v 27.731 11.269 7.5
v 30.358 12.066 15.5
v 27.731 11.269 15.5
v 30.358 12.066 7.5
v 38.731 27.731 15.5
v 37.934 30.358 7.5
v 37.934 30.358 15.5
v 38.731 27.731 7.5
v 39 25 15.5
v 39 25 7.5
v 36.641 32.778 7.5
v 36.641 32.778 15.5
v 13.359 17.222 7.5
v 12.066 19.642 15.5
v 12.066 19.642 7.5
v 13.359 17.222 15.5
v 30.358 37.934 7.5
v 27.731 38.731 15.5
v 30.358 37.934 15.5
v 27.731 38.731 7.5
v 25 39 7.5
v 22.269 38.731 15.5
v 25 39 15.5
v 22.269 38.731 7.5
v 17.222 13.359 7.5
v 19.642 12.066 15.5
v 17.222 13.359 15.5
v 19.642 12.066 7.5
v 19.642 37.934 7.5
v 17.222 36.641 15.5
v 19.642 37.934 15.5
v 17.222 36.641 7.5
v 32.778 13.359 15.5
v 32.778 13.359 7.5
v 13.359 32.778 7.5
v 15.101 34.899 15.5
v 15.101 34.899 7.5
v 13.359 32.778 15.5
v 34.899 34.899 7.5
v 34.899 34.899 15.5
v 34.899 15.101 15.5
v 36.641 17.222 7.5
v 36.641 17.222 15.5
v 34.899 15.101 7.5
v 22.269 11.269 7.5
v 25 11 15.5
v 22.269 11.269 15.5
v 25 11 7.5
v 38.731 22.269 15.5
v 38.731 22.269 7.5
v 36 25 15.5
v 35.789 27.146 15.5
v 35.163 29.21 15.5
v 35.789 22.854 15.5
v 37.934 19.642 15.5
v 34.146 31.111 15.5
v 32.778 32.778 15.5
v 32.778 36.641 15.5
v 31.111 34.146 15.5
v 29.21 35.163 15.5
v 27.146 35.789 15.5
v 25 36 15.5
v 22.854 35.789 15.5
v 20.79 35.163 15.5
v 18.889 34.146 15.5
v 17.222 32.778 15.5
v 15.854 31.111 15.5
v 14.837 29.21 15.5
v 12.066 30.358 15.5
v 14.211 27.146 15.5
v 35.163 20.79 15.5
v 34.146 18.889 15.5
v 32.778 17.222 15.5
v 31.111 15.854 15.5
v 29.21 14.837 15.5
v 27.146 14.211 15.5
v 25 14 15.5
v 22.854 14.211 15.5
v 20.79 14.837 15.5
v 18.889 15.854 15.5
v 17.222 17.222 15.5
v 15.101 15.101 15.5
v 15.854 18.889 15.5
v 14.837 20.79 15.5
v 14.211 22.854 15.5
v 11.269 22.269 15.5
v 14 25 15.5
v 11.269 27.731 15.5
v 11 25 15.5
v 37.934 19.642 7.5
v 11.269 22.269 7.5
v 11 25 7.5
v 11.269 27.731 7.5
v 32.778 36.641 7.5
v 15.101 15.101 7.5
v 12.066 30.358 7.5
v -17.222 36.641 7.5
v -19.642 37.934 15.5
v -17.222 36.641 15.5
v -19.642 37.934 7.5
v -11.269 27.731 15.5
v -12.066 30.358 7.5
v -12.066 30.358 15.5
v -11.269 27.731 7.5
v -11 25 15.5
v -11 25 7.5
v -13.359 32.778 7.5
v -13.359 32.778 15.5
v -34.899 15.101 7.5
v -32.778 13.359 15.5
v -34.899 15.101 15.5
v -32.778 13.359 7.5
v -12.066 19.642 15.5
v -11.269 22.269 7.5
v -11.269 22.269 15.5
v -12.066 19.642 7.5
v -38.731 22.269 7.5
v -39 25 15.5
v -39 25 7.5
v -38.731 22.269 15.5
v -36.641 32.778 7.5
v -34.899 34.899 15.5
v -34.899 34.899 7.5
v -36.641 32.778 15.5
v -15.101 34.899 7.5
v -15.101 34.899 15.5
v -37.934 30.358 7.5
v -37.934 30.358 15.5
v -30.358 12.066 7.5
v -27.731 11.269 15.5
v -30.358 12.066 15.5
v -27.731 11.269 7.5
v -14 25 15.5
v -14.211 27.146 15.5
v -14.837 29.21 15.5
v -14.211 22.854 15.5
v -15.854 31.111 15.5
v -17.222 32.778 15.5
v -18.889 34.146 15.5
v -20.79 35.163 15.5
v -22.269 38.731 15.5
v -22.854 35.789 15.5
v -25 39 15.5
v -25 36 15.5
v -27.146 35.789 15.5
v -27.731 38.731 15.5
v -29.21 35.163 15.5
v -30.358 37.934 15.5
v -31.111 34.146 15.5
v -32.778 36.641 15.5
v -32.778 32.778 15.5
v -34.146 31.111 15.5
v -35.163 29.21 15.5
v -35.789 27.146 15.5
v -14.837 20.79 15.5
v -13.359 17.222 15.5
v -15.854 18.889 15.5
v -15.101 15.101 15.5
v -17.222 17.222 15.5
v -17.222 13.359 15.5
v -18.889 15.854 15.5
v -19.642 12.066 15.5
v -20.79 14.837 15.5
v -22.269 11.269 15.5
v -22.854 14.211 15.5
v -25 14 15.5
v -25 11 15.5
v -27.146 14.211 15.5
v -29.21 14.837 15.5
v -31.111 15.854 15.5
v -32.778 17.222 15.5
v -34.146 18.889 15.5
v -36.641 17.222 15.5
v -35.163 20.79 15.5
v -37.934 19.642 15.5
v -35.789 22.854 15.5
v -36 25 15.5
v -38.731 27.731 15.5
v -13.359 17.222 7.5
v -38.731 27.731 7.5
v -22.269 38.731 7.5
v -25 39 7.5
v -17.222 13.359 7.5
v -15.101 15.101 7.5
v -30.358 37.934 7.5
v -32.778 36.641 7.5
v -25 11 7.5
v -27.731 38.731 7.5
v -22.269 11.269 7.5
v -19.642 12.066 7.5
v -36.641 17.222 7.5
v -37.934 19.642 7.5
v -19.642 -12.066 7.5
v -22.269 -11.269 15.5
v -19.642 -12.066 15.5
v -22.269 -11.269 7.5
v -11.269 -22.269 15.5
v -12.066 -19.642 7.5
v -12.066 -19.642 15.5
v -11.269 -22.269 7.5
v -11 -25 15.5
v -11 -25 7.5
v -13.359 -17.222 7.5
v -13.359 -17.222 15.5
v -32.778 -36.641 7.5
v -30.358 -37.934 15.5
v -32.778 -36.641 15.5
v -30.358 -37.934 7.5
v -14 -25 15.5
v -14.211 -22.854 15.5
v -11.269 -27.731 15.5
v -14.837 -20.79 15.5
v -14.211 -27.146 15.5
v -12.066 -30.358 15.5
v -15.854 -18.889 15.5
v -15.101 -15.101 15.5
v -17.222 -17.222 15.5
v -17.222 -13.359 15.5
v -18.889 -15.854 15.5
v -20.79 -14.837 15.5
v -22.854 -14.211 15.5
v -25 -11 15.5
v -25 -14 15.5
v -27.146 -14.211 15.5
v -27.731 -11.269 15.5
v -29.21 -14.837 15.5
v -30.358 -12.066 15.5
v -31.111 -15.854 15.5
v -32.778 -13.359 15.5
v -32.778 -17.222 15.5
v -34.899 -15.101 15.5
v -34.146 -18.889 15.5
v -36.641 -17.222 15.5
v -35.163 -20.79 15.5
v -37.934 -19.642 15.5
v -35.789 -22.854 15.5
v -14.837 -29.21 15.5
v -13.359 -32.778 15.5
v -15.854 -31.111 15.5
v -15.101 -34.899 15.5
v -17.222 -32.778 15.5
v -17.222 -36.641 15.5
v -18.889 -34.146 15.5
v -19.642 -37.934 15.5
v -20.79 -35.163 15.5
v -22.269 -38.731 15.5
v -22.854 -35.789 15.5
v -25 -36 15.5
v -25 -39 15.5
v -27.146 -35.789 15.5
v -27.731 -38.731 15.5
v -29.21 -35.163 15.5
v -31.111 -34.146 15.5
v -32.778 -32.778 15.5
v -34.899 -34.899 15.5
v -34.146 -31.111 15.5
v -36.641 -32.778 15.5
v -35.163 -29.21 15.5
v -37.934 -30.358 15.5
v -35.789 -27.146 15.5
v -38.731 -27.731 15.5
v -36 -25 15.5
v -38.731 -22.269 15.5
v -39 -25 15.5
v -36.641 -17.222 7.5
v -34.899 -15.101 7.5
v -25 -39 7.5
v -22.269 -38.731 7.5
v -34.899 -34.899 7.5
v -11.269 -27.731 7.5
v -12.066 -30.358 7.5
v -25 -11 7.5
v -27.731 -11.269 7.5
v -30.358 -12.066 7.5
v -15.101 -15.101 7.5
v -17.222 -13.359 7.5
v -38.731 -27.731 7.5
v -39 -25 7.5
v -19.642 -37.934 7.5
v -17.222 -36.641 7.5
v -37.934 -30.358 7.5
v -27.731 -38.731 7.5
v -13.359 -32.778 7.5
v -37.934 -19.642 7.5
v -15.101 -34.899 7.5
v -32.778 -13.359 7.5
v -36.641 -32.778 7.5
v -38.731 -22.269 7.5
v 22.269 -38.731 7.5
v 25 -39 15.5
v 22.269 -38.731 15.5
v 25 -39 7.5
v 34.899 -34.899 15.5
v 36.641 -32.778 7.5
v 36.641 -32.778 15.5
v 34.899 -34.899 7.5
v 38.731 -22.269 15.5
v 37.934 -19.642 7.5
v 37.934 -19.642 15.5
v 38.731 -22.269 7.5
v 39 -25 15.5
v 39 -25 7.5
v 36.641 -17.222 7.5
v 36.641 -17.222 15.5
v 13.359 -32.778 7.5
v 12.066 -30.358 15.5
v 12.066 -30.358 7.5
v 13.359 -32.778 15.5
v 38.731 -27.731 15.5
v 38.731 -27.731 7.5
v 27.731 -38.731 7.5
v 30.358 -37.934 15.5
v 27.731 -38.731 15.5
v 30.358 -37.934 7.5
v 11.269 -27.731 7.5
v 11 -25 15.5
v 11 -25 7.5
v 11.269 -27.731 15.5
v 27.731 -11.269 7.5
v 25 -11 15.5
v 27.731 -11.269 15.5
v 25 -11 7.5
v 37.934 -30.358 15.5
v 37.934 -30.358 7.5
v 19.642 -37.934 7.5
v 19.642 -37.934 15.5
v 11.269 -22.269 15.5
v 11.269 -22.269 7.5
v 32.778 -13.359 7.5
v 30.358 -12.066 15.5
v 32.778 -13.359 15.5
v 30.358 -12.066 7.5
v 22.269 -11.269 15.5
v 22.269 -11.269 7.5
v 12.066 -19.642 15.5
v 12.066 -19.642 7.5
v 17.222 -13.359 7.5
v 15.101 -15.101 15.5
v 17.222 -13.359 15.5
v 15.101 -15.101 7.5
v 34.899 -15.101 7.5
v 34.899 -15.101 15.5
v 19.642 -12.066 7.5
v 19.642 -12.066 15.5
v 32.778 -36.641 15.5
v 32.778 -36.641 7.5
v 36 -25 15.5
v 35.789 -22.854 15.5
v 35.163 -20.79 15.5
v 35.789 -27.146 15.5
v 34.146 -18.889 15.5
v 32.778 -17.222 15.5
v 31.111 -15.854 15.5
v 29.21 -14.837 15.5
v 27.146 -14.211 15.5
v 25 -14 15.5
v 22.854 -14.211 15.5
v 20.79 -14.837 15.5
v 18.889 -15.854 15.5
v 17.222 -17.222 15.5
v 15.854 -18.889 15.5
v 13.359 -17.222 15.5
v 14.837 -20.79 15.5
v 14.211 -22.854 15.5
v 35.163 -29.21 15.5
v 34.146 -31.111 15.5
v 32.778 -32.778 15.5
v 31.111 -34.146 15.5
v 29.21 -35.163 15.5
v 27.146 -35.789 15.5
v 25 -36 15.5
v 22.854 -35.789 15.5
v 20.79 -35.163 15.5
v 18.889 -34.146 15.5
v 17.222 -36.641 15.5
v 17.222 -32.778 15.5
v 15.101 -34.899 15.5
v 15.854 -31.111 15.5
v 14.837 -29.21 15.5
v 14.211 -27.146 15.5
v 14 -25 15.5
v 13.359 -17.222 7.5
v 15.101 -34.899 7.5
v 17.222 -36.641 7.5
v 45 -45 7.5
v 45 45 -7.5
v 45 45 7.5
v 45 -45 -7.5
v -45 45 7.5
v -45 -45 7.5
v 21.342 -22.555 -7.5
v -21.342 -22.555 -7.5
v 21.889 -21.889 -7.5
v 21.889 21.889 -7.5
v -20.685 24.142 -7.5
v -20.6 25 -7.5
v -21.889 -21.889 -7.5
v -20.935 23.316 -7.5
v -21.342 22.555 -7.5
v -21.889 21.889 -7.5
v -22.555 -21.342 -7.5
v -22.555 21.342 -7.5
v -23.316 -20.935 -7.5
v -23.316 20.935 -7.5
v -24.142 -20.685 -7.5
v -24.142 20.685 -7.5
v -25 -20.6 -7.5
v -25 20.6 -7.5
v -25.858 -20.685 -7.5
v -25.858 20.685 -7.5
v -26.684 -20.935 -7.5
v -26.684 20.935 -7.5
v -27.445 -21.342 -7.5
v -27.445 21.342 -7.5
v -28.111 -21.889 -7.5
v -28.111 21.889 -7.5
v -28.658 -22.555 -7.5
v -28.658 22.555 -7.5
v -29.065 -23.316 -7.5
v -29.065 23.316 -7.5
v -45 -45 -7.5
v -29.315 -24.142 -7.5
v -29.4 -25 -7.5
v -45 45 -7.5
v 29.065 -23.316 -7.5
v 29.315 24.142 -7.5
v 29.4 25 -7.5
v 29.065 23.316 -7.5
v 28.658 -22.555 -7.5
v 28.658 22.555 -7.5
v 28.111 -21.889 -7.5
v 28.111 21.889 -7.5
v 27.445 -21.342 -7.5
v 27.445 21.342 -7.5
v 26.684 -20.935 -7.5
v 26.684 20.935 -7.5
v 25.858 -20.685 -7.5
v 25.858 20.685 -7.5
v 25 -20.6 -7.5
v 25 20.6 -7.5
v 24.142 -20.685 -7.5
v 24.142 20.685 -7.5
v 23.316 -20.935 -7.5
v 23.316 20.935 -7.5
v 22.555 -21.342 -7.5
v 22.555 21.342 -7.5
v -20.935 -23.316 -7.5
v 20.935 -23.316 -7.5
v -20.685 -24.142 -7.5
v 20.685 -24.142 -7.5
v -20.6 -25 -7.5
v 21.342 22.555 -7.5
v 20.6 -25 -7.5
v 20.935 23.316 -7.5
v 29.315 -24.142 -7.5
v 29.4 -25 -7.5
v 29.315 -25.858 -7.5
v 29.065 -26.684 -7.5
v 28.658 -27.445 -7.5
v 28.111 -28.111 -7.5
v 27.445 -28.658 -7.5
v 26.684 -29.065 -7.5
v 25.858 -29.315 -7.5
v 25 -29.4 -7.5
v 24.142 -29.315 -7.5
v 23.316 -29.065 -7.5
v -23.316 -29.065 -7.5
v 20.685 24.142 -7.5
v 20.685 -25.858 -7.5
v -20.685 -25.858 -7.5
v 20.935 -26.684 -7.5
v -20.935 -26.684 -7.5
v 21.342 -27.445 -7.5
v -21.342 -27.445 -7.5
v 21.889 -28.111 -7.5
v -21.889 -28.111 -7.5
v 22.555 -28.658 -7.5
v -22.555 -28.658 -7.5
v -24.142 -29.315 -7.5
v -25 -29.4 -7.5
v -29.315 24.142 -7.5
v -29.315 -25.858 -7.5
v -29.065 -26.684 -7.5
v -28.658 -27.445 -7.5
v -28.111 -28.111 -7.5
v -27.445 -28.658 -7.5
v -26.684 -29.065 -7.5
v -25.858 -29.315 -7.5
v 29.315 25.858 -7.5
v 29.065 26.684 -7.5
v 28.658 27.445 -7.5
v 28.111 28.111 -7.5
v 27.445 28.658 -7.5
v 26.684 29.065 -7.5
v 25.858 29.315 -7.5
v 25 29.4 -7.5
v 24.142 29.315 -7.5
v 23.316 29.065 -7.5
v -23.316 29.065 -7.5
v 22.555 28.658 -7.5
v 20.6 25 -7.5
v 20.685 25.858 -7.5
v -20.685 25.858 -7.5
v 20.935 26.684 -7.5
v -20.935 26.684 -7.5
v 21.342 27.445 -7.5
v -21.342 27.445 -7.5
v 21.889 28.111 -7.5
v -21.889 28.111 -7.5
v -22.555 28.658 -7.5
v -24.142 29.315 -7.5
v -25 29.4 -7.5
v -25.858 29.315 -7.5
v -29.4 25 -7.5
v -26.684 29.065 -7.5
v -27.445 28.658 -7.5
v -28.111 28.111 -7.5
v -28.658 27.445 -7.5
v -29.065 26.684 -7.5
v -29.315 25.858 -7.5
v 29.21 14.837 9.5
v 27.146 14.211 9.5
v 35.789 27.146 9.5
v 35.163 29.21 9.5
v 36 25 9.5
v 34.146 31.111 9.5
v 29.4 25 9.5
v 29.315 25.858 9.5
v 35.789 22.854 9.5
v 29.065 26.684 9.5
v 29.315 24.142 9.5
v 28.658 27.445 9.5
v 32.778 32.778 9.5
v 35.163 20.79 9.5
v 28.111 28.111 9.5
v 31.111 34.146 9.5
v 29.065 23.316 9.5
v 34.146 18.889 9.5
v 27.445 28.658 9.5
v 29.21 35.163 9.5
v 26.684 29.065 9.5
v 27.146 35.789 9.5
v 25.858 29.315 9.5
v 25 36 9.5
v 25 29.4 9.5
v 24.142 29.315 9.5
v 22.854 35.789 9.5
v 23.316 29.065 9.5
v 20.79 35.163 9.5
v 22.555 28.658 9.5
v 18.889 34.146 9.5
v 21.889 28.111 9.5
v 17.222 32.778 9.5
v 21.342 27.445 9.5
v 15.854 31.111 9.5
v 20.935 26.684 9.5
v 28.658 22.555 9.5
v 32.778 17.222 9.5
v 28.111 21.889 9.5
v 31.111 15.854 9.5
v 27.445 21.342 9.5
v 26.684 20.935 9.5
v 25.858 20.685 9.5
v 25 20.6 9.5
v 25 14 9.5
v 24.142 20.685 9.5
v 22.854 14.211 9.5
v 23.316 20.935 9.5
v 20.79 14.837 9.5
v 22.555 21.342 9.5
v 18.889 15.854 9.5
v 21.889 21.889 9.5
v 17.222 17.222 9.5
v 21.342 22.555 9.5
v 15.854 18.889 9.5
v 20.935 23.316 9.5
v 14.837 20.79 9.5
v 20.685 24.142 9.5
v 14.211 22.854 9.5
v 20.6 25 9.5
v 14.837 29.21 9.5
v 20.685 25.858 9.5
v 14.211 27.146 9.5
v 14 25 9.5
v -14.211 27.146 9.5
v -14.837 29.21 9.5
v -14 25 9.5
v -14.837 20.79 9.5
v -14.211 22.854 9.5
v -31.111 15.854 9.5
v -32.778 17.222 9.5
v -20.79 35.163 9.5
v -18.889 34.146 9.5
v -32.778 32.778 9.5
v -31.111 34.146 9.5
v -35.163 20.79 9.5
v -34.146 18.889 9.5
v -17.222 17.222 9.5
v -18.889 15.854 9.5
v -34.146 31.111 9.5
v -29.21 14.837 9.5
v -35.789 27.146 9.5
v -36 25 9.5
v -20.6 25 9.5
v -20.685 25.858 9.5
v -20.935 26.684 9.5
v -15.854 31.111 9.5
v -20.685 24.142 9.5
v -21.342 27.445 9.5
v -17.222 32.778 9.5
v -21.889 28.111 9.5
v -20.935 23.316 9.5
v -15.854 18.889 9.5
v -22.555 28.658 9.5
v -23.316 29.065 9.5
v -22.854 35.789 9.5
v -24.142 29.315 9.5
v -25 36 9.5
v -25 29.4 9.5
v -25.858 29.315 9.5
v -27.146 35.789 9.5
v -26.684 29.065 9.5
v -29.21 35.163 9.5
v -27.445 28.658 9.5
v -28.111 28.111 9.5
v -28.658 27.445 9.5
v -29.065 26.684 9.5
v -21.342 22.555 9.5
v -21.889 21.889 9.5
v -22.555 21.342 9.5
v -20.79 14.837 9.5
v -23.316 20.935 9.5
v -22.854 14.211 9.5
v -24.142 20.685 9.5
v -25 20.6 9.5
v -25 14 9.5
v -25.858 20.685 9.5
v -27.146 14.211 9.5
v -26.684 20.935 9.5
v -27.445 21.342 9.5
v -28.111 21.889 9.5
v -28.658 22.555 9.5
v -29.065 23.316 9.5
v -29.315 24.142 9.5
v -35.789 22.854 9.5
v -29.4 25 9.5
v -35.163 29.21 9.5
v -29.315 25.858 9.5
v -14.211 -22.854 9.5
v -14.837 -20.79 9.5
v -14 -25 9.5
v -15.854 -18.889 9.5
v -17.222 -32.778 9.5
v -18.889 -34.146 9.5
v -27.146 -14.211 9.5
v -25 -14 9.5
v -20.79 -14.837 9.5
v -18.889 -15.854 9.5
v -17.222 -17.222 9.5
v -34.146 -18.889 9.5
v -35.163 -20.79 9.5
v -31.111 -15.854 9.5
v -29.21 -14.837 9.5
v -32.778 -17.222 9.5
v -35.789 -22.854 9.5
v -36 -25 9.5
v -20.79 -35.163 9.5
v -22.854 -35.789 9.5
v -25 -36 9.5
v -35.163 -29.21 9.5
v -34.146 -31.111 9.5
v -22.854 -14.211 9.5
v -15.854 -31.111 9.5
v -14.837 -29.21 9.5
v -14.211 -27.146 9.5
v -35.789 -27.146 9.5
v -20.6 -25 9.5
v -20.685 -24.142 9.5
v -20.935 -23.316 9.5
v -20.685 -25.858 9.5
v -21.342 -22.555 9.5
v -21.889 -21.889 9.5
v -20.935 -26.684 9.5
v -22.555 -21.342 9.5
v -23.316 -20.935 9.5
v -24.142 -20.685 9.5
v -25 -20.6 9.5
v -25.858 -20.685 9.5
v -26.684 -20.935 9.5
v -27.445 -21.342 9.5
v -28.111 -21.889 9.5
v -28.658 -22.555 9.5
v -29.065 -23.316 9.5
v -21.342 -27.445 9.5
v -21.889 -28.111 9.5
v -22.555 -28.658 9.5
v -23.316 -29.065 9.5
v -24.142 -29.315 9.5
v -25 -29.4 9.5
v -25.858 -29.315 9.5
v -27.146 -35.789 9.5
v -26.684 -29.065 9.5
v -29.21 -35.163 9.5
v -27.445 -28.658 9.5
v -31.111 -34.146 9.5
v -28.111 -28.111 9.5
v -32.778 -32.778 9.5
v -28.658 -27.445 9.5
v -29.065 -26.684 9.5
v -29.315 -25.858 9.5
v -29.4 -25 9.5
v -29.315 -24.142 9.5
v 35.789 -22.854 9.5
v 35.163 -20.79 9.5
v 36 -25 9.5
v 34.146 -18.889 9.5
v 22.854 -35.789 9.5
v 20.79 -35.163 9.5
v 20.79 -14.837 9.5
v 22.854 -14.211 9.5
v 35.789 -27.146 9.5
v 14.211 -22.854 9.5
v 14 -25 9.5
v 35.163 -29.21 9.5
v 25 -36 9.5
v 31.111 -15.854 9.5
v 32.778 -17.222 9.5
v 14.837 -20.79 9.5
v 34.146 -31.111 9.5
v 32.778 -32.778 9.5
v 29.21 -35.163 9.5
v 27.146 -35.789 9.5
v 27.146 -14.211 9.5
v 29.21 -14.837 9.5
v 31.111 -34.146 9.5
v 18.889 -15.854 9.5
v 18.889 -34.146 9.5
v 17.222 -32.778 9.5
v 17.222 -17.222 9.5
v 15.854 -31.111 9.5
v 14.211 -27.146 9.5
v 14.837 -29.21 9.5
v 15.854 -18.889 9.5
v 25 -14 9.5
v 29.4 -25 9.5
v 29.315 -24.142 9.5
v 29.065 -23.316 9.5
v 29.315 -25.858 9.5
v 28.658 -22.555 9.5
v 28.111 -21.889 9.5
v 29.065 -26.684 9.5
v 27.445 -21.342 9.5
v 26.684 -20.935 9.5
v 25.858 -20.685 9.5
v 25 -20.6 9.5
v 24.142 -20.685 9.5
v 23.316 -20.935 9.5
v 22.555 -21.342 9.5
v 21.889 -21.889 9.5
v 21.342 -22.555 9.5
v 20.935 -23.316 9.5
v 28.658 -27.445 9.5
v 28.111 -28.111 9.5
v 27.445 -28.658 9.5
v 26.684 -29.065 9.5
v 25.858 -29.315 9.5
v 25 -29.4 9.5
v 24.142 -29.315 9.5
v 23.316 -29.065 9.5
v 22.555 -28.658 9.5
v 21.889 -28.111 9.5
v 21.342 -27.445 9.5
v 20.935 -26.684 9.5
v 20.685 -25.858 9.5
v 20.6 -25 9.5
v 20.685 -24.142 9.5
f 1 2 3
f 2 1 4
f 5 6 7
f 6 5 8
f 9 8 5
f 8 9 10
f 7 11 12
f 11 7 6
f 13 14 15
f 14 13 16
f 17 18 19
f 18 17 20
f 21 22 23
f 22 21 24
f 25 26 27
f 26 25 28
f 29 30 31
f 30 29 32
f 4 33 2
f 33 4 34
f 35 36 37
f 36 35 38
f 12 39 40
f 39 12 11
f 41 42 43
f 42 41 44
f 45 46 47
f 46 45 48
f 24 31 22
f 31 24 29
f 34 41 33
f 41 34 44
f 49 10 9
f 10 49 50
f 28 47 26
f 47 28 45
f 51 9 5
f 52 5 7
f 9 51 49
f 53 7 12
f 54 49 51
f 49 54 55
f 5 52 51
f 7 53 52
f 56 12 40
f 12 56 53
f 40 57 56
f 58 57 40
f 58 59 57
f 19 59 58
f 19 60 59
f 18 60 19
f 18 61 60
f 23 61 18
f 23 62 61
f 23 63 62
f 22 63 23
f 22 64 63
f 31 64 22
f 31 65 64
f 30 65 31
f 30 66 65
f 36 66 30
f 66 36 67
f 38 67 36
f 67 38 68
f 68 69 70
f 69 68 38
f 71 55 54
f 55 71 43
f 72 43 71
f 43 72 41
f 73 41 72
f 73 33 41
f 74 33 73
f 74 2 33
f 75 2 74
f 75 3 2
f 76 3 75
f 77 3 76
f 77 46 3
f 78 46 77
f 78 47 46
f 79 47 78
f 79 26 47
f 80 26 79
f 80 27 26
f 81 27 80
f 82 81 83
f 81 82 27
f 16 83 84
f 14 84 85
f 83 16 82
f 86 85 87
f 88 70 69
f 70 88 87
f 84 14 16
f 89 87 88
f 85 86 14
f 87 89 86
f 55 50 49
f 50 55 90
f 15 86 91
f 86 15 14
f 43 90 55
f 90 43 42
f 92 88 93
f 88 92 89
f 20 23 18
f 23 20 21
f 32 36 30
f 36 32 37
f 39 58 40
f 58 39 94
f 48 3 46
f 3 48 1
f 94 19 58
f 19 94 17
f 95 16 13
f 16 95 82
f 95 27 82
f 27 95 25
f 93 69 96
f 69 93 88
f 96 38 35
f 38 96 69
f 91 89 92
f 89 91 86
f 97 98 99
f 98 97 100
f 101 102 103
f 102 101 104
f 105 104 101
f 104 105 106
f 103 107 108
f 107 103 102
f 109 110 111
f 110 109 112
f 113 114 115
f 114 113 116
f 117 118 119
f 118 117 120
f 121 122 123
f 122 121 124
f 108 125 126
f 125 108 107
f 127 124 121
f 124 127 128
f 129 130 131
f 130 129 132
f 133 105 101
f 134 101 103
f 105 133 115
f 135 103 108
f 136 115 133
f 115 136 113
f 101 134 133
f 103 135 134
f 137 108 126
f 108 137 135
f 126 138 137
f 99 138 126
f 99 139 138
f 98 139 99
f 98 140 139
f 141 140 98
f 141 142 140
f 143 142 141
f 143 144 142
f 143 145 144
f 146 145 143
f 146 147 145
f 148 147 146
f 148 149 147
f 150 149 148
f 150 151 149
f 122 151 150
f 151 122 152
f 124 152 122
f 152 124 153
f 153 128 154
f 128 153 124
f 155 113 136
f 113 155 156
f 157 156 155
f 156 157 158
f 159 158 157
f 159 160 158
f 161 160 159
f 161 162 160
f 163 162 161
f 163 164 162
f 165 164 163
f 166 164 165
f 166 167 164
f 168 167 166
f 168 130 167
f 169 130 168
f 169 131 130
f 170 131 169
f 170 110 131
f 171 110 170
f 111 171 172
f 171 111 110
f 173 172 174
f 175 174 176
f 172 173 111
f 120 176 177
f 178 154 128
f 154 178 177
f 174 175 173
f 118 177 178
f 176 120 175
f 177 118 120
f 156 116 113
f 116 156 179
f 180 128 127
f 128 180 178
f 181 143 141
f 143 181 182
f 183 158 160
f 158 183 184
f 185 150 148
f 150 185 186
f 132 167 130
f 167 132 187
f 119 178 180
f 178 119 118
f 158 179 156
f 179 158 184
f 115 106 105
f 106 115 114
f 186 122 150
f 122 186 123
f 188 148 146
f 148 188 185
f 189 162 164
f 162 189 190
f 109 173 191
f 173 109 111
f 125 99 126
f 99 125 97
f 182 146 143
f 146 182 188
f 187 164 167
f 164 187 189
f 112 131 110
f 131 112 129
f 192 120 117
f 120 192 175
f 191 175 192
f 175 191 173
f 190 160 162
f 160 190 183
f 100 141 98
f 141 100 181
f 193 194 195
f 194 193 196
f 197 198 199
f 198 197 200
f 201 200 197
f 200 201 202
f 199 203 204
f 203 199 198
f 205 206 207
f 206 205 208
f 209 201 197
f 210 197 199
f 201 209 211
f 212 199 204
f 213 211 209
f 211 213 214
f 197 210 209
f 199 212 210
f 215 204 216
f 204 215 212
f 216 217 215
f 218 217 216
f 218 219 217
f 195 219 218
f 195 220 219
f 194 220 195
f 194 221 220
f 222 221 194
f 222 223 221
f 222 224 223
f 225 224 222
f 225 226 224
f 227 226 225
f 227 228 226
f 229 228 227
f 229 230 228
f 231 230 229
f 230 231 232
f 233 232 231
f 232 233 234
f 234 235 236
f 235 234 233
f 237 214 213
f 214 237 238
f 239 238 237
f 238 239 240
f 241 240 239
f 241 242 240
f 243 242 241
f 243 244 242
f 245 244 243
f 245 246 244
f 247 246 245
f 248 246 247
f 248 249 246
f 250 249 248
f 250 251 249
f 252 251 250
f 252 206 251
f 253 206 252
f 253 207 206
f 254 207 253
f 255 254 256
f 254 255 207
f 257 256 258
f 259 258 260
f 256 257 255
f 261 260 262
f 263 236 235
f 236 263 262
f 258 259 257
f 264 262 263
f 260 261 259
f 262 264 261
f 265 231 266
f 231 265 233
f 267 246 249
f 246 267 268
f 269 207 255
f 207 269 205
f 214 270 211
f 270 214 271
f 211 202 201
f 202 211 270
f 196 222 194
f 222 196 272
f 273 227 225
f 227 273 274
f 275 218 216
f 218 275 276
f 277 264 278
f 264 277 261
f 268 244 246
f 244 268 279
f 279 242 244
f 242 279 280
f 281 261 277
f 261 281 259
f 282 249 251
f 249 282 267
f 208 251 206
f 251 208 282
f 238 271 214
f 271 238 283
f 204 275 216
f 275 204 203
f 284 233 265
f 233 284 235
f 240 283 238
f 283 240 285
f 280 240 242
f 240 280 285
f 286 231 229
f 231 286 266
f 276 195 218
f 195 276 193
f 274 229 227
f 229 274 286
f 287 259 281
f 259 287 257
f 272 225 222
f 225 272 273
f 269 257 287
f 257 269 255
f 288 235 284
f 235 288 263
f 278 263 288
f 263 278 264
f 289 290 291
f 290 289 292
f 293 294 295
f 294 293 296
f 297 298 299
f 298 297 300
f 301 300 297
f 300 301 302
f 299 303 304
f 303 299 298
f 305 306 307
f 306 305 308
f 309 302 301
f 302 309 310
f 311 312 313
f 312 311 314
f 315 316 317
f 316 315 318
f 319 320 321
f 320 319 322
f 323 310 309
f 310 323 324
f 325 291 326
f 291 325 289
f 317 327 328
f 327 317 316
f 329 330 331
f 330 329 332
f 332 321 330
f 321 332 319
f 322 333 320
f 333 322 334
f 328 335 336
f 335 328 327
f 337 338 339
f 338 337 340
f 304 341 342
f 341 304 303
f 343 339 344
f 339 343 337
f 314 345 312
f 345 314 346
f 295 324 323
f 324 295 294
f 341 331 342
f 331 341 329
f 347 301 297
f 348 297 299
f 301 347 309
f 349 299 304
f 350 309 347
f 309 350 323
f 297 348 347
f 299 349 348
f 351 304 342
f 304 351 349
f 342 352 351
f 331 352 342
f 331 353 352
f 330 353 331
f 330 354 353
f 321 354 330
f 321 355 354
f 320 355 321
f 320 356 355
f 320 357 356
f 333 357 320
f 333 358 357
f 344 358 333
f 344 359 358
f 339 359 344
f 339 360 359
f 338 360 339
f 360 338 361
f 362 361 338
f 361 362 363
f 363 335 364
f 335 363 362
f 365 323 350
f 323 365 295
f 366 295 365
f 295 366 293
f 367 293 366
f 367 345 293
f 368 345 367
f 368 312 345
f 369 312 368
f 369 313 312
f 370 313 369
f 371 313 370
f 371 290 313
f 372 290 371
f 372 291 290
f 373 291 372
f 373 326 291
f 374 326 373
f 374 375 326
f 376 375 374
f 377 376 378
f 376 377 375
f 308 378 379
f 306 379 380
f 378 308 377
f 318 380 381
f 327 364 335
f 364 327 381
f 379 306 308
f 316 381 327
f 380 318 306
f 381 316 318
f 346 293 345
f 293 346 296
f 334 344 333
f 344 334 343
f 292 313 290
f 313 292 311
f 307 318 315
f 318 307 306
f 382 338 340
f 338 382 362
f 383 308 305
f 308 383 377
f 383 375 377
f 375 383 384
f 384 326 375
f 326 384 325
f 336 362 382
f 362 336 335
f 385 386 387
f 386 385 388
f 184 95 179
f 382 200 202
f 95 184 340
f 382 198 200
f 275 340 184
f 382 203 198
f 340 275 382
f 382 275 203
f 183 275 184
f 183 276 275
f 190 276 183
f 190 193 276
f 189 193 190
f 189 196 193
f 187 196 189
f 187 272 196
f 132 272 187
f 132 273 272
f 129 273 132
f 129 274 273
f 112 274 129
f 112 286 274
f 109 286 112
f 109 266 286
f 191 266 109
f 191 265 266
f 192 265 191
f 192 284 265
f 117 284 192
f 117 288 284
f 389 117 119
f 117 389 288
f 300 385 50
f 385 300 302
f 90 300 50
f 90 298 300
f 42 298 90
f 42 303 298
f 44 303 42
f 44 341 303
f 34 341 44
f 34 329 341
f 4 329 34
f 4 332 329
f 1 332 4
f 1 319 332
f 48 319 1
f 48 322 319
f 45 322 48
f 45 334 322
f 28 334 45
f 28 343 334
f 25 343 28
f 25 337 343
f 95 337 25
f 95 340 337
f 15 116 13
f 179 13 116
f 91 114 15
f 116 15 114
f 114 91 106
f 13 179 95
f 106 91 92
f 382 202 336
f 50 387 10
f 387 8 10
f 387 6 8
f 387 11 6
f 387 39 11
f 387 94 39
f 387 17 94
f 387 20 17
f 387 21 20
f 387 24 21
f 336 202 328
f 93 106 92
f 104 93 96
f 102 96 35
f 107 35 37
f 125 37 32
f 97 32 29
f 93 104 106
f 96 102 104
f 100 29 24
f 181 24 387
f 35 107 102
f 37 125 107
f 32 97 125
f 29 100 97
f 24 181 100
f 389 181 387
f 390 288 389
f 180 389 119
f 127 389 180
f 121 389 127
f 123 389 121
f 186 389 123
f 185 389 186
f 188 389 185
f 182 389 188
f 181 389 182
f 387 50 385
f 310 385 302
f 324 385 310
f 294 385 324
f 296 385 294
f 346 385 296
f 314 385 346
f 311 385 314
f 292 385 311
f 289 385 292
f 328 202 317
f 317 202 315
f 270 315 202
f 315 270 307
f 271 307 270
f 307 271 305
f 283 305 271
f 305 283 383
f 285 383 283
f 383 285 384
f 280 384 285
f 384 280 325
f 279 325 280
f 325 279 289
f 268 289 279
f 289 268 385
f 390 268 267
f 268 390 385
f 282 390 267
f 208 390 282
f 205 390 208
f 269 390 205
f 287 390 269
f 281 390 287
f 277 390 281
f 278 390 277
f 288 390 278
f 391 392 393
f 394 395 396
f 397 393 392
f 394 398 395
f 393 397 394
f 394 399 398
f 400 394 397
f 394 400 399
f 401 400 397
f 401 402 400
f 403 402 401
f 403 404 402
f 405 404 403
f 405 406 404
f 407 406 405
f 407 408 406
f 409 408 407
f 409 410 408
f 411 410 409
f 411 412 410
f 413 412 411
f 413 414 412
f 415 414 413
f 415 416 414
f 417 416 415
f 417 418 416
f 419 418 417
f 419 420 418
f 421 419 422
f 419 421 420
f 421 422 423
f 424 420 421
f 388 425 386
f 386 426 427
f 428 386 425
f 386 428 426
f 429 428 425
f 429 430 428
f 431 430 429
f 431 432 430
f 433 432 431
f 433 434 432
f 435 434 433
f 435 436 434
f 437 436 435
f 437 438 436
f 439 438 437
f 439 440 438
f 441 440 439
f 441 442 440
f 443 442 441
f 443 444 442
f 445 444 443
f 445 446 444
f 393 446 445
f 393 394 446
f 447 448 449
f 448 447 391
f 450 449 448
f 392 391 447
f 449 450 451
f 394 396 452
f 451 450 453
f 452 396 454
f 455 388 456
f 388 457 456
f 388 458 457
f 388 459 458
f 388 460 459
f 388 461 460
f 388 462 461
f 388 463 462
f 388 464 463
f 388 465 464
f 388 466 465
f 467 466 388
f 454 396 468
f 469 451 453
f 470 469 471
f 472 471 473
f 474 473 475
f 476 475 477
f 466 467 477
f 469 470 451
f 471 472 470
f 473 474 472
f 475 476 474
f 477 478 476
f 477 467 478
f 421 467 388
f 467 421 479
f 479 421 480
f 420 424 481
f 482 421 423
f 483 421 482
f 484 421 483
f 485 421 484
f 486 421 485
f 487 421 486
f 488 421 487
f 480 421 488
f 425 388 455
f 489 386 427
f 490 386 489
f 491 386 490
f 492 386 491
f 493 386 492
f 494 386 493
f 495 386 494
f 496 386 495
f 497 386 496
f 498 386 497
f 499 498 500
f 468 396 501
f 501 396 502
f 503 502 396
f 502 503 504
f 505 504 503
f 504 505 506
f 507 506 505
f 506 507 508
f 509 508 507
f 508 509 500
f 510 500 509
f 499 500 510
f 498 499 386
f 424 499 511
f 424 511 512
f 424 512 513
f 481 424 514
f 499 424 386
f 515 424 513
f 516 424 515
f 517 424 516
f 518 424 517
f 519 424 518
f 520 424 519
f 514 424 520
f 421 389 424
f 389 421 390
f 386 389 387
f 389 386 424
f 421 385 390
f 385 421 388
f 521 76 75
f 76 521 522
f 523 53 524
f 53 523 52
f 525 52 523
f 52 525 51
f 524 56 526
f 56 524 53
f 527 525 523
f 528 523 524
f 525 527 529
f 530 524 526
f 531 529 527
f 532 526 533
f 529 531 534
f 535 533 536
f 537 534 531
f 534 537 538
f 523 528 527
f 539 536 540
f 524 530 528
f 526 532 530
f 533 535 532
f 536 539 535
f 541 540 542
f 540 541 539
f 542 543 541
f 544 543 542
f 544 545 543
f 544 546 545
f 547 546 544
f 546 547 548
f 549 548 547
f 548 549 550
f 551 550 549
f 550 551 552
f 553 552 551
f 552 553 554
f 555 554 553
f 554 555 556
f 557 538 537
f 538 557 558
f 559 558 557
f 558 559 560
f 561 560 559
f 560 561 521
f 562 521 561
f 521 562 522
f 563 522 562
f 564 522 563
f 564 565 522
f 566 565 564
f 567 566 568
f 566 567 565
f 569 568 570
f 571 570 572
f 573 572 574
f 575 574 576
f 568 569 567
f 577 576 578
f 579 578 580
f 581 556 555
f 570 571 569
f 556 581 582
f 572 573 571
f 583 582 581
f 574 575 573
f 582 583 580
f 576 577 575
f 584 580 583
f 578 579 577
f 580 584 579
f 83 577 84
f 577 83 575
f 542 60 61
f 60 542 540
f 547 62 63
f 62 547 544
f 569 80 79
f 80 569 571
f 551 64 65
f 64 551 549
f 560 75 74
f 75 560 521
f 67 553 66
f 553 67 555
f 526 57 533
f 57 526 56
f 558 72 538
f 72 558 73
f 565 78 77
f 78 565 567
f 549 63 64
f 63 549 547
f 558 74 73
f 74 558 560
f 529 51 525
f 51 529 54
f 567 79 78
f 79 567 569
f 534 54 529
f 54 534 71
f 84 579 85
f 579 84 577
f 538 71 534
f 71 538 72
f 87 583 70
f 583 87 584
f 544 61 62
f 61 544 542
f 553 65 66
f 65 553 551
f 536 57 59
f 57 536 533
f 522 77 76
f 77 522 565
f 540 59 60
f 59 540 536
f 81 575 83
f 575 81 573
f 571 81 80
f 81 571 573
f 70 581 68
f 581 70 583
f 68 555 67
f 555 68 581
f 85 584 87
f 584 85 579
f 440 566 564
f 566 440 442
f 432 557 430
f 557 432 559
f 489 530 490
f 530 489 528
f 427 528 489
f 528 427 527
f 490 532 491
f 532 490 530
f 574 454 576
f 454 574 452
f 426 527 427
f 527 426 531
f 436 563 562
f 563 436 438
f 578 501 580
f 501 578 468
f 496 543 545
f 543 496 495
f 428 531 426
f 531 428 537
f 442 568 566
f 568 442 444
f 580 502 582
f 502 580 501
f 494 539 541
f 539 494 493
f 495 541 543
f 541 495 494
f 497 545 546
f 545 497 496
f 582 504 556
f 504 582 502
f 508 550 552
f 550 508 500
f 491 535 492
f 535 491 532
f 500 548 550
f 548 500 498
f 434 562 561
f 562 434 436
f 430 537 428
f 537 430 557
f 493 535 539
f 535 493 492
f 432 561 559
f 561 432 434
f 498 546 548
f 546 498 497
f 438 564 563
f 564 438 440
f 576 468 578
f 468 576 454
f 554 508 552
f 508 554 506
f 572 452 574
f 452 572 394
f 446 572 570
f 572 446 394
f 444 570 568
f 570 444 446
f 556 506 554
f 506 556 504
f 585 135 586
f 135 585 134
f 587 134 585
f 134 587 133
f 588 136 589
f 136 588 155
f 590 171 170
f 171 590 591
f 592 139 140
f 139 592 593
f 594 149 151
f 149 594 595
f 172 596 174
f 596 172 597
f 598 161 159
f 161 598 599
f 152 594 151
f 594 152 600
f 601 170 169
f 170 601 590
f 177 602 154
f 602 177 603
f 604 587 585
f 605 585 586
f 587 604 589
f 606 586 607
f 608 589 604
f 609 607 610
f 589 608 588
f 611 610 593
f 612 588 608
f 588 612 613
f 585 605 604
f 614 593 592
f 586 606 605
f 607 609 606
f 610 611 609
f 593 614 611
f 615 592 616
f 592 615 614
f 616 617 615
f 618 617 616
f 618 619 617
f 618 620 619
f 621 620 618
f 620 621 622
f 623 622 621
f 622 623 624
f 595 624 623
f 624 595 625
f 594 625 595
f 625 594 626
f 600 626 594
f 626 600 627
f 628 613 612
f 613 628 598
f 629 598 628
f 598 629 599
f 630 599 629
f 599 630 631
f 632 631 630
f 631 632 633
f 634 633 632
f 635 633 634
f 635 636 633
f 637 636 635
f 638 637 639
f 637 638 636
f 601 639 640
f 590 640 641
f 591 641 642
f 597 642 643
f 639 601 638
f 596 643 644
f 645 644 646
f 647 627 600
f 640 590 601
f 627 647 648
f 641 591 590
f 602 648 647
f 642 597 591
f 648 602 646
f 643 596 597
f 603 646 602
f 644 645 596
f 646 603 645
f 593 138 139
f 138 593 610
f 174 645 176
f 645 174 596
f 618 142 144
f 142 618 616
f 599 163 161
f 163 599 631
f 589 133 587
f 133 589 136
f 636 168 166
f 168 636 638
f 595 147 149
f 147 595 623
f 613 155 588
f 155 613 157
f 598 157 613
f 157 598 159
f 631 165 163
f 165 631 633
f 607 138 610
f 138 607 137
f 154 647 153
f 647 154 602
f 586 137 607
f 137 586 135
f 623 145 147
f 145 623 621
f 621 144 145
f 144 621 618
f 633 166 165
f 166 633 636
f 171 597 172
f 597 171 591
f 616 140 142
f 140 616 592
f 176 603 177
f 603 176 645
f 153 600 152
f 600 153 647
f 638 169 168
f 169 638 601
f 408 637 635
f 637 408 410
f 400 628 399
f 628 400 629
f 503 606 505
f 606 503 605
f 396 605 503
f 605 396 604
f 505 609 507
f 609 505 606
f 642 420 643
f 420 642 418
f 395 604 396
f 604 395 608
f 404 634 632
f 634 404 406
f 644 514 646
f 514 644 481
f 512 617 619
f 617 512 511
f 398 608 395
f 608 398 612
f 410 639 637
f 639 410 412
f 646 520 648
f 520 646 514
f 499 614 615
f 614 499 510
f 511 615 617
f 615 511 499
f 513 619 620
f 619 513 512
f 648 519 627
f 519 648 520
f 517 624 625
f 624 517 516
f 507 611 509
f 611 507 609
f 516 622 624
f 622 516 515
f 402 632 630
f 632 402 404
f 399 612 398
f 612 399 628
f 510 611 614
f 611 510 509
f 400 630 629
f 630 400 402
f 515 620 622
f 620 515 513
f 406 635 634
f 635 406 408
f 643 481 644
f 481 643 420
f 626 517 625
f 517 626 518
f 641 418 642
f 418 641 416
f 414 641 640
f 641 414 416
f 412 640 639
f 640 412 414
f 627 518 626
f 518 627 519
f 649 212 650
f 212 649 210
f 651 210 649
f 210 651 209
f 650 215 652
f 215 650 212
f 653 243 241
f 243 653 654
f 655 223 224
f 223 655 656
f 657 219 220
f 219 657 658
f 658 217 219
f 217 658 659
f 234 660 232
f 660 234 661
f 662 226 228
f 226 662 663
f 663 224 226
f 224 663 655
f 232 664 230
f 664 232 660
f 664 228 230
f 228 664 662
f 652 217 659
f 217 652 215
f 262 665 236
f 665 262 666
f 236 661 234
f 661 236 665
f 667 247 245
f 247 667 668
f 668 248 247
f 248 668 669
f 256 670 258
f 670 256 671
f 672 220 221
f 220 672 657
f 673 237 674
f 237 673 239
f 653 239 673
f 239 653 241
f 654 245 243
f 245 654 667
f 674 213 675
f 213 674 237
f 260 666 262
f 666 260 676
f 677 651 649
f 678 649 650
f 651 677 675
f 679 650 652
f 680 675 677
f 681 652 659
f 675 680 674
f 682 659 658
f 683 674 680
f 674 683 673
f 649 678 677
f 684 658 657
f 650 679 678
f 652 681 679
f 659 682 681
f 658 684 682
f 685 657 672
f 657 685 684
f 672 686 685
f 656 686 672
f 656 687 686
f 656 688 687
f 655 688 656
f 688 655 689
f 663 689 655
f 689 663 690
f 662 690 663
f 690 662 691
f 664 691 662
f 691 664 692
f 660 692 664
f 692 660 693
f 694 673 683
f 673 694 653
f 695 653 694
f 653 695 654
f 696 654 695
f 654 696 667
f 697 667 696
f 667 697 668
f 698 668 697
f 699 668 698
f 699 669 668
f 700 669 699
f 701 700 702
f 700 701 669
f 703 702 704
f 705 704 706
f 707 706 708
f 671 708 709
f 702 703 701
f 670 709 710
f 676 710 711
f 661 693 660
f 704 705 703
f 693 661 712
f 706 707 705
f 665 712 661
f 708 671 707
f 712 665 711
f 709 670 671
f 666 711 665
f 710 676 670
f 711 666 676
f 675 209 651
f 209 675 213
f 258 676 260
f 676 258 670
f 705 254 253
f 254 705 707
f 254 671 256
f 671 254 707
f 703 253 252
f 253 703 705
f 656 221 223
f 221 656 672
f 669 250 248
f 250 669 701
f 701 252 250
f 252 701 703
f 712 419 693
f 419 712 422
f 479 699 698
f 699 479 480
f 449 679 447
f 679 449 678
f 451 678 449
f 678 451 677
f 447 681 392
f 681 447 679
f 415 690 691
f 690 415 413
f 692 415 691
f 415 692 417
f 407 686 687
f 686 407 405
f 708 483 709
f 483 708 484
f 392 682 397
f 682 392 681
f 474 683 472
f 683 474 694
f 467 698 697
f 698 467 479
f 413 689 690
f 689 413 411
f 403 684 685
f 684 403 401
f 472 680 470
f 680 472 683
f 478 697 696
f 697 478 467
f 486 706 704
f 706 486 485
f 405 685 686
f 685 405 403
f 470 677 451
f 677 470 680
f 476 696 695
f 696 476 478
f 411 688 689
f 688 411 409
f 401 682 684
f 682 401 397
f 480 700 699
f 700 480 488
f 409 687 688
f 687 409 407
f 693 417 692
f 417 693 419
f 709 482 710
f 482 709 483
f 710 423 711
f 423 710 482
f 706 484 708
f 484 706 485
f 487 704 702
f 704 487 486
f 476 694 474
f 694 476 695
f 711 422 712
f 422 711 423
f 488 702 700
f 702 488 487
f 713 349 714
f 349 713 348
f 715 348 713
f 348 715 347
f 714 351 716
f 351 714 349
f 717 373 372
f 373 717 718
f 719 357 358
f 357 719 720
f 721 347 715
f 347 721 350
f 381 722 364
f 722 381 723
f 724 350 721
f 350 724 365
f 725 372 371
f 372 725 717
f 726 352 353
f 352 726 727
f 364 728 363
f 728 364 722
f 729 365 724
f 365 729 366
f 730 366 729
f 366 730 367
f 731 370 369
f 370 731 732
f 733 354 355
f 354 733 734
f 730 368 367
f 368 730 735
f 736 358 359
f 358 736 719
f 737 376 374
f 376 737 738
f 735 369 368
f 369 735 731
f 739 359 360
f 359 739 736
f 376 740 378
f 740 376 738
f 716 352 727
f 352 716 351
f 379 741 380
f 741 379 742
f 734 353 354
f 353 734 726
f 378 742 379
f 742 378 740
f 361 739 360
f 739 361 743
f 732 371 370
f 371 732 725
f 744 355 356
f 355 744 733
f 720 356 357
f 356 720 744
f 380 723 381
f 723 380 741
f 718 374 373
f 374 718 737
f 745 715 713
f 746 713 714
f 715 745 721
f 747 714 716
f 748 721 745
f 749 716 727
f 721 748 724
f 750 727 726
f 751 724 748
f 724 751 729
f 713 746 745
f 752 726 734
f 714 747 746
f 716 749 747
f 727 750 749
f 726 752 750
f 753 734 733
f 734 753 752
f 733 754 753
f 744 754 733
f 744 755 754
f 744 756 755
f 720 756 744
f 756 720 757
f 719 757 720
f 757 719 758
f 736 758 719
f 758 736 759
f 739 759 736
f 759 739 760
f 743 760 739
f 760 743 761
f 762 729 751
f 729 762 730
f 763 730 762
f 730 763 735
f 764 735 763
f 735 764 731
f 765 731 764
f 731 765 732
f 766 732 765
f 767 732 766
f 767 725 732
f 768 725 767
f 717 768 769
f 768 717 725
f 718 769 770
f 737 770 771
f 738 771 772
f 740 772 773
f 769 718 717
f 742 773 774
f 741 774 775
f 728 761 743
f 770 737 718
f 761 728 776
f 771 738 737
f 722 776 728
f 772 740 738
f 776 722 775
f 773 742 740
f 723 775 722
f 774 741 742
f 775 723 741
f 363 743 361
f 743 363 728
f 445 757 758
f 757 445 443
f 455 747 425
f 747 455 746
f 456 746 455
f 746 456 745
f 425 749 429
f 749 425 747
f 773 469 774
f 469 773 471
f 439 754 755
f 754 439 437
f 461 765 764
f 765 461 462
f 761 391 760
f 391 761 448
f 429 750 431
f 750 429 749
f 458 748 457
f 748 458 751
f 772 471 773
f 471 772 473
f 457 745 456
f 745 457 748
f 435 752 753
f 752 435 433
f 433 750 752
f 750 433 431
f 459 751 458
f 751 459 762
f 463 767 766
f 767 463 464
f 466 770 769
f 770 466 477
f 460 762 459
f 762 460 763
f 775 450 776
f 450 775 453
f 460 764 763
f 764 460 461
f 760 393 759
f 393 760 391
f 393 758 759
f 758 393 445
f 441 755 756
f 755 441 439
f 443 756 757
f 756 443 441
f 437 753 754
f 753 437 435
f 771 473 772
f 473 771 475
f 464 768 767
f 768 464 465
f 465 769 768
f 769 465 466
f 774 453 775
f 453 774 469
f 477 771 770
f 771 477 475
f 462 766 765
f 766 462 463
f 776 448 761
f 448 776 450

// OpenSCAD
$fn = 32;

// ----------------------------------------------------------------------
// Socket pad plate
// bosses with counterbored sockets for the screws
// ----------------------------------------------------------------------

// --- parameters (mm) ---
base_t = 15;           // base plate thickness
boss_h = 8;            // boss height above the base plate
boss_d = 28;           // boss diameter
socket_d = 22;         // socket diameter
socket_depth = 6;      // socket depth from the boss face
bolt_d = 8.8;          // screw clearance hole through the socket floor
plate = [90, 90, 15];  // overall size (x, y, z)
edge = 20;             // boss centre offset from the plate edge
pads = 4;              // boss count, one per corner

// --- derived feature positions (mm) ---
height = base_t + boss_h;        // = 23   overall height of the part
corner_x = plate[0] / 2 - edge;  // = 25   boss centre X
corner_y = plate[1] / 2 - edge;  // = 25   boss centre Y
feature_centers = [
  [corner_x, corner_y],
  [-corner_x, corner_y],
  [-corner_x, -corner_y],
  [corner_x, -corner_y]
];   // boss centres: sockets, holes and the pads themselves are placed from here

// base plate, bosses on feature_centers, socket + through hole in each
difference() {
  union() {
    cube(plate, center = true);
    for (centre = feature_centers)
      translate([centre[0], centre[1], plate[2] / 2 - 1])
        cylinder(d = boss_d, h = boss_h + 1);
  }
  for (centre = feature_centers) {
    translate([centre[0], centre[1], plate[2] / 2 + boss_h - socket_depth])
      cylinder(d = socket_d, h = socket_depth + 1);
    translate([centre[0], centre[1], -height])
      cylinder(d = bolt_d, h = 2 * height + 2);  // through the socket floor
  }
}
